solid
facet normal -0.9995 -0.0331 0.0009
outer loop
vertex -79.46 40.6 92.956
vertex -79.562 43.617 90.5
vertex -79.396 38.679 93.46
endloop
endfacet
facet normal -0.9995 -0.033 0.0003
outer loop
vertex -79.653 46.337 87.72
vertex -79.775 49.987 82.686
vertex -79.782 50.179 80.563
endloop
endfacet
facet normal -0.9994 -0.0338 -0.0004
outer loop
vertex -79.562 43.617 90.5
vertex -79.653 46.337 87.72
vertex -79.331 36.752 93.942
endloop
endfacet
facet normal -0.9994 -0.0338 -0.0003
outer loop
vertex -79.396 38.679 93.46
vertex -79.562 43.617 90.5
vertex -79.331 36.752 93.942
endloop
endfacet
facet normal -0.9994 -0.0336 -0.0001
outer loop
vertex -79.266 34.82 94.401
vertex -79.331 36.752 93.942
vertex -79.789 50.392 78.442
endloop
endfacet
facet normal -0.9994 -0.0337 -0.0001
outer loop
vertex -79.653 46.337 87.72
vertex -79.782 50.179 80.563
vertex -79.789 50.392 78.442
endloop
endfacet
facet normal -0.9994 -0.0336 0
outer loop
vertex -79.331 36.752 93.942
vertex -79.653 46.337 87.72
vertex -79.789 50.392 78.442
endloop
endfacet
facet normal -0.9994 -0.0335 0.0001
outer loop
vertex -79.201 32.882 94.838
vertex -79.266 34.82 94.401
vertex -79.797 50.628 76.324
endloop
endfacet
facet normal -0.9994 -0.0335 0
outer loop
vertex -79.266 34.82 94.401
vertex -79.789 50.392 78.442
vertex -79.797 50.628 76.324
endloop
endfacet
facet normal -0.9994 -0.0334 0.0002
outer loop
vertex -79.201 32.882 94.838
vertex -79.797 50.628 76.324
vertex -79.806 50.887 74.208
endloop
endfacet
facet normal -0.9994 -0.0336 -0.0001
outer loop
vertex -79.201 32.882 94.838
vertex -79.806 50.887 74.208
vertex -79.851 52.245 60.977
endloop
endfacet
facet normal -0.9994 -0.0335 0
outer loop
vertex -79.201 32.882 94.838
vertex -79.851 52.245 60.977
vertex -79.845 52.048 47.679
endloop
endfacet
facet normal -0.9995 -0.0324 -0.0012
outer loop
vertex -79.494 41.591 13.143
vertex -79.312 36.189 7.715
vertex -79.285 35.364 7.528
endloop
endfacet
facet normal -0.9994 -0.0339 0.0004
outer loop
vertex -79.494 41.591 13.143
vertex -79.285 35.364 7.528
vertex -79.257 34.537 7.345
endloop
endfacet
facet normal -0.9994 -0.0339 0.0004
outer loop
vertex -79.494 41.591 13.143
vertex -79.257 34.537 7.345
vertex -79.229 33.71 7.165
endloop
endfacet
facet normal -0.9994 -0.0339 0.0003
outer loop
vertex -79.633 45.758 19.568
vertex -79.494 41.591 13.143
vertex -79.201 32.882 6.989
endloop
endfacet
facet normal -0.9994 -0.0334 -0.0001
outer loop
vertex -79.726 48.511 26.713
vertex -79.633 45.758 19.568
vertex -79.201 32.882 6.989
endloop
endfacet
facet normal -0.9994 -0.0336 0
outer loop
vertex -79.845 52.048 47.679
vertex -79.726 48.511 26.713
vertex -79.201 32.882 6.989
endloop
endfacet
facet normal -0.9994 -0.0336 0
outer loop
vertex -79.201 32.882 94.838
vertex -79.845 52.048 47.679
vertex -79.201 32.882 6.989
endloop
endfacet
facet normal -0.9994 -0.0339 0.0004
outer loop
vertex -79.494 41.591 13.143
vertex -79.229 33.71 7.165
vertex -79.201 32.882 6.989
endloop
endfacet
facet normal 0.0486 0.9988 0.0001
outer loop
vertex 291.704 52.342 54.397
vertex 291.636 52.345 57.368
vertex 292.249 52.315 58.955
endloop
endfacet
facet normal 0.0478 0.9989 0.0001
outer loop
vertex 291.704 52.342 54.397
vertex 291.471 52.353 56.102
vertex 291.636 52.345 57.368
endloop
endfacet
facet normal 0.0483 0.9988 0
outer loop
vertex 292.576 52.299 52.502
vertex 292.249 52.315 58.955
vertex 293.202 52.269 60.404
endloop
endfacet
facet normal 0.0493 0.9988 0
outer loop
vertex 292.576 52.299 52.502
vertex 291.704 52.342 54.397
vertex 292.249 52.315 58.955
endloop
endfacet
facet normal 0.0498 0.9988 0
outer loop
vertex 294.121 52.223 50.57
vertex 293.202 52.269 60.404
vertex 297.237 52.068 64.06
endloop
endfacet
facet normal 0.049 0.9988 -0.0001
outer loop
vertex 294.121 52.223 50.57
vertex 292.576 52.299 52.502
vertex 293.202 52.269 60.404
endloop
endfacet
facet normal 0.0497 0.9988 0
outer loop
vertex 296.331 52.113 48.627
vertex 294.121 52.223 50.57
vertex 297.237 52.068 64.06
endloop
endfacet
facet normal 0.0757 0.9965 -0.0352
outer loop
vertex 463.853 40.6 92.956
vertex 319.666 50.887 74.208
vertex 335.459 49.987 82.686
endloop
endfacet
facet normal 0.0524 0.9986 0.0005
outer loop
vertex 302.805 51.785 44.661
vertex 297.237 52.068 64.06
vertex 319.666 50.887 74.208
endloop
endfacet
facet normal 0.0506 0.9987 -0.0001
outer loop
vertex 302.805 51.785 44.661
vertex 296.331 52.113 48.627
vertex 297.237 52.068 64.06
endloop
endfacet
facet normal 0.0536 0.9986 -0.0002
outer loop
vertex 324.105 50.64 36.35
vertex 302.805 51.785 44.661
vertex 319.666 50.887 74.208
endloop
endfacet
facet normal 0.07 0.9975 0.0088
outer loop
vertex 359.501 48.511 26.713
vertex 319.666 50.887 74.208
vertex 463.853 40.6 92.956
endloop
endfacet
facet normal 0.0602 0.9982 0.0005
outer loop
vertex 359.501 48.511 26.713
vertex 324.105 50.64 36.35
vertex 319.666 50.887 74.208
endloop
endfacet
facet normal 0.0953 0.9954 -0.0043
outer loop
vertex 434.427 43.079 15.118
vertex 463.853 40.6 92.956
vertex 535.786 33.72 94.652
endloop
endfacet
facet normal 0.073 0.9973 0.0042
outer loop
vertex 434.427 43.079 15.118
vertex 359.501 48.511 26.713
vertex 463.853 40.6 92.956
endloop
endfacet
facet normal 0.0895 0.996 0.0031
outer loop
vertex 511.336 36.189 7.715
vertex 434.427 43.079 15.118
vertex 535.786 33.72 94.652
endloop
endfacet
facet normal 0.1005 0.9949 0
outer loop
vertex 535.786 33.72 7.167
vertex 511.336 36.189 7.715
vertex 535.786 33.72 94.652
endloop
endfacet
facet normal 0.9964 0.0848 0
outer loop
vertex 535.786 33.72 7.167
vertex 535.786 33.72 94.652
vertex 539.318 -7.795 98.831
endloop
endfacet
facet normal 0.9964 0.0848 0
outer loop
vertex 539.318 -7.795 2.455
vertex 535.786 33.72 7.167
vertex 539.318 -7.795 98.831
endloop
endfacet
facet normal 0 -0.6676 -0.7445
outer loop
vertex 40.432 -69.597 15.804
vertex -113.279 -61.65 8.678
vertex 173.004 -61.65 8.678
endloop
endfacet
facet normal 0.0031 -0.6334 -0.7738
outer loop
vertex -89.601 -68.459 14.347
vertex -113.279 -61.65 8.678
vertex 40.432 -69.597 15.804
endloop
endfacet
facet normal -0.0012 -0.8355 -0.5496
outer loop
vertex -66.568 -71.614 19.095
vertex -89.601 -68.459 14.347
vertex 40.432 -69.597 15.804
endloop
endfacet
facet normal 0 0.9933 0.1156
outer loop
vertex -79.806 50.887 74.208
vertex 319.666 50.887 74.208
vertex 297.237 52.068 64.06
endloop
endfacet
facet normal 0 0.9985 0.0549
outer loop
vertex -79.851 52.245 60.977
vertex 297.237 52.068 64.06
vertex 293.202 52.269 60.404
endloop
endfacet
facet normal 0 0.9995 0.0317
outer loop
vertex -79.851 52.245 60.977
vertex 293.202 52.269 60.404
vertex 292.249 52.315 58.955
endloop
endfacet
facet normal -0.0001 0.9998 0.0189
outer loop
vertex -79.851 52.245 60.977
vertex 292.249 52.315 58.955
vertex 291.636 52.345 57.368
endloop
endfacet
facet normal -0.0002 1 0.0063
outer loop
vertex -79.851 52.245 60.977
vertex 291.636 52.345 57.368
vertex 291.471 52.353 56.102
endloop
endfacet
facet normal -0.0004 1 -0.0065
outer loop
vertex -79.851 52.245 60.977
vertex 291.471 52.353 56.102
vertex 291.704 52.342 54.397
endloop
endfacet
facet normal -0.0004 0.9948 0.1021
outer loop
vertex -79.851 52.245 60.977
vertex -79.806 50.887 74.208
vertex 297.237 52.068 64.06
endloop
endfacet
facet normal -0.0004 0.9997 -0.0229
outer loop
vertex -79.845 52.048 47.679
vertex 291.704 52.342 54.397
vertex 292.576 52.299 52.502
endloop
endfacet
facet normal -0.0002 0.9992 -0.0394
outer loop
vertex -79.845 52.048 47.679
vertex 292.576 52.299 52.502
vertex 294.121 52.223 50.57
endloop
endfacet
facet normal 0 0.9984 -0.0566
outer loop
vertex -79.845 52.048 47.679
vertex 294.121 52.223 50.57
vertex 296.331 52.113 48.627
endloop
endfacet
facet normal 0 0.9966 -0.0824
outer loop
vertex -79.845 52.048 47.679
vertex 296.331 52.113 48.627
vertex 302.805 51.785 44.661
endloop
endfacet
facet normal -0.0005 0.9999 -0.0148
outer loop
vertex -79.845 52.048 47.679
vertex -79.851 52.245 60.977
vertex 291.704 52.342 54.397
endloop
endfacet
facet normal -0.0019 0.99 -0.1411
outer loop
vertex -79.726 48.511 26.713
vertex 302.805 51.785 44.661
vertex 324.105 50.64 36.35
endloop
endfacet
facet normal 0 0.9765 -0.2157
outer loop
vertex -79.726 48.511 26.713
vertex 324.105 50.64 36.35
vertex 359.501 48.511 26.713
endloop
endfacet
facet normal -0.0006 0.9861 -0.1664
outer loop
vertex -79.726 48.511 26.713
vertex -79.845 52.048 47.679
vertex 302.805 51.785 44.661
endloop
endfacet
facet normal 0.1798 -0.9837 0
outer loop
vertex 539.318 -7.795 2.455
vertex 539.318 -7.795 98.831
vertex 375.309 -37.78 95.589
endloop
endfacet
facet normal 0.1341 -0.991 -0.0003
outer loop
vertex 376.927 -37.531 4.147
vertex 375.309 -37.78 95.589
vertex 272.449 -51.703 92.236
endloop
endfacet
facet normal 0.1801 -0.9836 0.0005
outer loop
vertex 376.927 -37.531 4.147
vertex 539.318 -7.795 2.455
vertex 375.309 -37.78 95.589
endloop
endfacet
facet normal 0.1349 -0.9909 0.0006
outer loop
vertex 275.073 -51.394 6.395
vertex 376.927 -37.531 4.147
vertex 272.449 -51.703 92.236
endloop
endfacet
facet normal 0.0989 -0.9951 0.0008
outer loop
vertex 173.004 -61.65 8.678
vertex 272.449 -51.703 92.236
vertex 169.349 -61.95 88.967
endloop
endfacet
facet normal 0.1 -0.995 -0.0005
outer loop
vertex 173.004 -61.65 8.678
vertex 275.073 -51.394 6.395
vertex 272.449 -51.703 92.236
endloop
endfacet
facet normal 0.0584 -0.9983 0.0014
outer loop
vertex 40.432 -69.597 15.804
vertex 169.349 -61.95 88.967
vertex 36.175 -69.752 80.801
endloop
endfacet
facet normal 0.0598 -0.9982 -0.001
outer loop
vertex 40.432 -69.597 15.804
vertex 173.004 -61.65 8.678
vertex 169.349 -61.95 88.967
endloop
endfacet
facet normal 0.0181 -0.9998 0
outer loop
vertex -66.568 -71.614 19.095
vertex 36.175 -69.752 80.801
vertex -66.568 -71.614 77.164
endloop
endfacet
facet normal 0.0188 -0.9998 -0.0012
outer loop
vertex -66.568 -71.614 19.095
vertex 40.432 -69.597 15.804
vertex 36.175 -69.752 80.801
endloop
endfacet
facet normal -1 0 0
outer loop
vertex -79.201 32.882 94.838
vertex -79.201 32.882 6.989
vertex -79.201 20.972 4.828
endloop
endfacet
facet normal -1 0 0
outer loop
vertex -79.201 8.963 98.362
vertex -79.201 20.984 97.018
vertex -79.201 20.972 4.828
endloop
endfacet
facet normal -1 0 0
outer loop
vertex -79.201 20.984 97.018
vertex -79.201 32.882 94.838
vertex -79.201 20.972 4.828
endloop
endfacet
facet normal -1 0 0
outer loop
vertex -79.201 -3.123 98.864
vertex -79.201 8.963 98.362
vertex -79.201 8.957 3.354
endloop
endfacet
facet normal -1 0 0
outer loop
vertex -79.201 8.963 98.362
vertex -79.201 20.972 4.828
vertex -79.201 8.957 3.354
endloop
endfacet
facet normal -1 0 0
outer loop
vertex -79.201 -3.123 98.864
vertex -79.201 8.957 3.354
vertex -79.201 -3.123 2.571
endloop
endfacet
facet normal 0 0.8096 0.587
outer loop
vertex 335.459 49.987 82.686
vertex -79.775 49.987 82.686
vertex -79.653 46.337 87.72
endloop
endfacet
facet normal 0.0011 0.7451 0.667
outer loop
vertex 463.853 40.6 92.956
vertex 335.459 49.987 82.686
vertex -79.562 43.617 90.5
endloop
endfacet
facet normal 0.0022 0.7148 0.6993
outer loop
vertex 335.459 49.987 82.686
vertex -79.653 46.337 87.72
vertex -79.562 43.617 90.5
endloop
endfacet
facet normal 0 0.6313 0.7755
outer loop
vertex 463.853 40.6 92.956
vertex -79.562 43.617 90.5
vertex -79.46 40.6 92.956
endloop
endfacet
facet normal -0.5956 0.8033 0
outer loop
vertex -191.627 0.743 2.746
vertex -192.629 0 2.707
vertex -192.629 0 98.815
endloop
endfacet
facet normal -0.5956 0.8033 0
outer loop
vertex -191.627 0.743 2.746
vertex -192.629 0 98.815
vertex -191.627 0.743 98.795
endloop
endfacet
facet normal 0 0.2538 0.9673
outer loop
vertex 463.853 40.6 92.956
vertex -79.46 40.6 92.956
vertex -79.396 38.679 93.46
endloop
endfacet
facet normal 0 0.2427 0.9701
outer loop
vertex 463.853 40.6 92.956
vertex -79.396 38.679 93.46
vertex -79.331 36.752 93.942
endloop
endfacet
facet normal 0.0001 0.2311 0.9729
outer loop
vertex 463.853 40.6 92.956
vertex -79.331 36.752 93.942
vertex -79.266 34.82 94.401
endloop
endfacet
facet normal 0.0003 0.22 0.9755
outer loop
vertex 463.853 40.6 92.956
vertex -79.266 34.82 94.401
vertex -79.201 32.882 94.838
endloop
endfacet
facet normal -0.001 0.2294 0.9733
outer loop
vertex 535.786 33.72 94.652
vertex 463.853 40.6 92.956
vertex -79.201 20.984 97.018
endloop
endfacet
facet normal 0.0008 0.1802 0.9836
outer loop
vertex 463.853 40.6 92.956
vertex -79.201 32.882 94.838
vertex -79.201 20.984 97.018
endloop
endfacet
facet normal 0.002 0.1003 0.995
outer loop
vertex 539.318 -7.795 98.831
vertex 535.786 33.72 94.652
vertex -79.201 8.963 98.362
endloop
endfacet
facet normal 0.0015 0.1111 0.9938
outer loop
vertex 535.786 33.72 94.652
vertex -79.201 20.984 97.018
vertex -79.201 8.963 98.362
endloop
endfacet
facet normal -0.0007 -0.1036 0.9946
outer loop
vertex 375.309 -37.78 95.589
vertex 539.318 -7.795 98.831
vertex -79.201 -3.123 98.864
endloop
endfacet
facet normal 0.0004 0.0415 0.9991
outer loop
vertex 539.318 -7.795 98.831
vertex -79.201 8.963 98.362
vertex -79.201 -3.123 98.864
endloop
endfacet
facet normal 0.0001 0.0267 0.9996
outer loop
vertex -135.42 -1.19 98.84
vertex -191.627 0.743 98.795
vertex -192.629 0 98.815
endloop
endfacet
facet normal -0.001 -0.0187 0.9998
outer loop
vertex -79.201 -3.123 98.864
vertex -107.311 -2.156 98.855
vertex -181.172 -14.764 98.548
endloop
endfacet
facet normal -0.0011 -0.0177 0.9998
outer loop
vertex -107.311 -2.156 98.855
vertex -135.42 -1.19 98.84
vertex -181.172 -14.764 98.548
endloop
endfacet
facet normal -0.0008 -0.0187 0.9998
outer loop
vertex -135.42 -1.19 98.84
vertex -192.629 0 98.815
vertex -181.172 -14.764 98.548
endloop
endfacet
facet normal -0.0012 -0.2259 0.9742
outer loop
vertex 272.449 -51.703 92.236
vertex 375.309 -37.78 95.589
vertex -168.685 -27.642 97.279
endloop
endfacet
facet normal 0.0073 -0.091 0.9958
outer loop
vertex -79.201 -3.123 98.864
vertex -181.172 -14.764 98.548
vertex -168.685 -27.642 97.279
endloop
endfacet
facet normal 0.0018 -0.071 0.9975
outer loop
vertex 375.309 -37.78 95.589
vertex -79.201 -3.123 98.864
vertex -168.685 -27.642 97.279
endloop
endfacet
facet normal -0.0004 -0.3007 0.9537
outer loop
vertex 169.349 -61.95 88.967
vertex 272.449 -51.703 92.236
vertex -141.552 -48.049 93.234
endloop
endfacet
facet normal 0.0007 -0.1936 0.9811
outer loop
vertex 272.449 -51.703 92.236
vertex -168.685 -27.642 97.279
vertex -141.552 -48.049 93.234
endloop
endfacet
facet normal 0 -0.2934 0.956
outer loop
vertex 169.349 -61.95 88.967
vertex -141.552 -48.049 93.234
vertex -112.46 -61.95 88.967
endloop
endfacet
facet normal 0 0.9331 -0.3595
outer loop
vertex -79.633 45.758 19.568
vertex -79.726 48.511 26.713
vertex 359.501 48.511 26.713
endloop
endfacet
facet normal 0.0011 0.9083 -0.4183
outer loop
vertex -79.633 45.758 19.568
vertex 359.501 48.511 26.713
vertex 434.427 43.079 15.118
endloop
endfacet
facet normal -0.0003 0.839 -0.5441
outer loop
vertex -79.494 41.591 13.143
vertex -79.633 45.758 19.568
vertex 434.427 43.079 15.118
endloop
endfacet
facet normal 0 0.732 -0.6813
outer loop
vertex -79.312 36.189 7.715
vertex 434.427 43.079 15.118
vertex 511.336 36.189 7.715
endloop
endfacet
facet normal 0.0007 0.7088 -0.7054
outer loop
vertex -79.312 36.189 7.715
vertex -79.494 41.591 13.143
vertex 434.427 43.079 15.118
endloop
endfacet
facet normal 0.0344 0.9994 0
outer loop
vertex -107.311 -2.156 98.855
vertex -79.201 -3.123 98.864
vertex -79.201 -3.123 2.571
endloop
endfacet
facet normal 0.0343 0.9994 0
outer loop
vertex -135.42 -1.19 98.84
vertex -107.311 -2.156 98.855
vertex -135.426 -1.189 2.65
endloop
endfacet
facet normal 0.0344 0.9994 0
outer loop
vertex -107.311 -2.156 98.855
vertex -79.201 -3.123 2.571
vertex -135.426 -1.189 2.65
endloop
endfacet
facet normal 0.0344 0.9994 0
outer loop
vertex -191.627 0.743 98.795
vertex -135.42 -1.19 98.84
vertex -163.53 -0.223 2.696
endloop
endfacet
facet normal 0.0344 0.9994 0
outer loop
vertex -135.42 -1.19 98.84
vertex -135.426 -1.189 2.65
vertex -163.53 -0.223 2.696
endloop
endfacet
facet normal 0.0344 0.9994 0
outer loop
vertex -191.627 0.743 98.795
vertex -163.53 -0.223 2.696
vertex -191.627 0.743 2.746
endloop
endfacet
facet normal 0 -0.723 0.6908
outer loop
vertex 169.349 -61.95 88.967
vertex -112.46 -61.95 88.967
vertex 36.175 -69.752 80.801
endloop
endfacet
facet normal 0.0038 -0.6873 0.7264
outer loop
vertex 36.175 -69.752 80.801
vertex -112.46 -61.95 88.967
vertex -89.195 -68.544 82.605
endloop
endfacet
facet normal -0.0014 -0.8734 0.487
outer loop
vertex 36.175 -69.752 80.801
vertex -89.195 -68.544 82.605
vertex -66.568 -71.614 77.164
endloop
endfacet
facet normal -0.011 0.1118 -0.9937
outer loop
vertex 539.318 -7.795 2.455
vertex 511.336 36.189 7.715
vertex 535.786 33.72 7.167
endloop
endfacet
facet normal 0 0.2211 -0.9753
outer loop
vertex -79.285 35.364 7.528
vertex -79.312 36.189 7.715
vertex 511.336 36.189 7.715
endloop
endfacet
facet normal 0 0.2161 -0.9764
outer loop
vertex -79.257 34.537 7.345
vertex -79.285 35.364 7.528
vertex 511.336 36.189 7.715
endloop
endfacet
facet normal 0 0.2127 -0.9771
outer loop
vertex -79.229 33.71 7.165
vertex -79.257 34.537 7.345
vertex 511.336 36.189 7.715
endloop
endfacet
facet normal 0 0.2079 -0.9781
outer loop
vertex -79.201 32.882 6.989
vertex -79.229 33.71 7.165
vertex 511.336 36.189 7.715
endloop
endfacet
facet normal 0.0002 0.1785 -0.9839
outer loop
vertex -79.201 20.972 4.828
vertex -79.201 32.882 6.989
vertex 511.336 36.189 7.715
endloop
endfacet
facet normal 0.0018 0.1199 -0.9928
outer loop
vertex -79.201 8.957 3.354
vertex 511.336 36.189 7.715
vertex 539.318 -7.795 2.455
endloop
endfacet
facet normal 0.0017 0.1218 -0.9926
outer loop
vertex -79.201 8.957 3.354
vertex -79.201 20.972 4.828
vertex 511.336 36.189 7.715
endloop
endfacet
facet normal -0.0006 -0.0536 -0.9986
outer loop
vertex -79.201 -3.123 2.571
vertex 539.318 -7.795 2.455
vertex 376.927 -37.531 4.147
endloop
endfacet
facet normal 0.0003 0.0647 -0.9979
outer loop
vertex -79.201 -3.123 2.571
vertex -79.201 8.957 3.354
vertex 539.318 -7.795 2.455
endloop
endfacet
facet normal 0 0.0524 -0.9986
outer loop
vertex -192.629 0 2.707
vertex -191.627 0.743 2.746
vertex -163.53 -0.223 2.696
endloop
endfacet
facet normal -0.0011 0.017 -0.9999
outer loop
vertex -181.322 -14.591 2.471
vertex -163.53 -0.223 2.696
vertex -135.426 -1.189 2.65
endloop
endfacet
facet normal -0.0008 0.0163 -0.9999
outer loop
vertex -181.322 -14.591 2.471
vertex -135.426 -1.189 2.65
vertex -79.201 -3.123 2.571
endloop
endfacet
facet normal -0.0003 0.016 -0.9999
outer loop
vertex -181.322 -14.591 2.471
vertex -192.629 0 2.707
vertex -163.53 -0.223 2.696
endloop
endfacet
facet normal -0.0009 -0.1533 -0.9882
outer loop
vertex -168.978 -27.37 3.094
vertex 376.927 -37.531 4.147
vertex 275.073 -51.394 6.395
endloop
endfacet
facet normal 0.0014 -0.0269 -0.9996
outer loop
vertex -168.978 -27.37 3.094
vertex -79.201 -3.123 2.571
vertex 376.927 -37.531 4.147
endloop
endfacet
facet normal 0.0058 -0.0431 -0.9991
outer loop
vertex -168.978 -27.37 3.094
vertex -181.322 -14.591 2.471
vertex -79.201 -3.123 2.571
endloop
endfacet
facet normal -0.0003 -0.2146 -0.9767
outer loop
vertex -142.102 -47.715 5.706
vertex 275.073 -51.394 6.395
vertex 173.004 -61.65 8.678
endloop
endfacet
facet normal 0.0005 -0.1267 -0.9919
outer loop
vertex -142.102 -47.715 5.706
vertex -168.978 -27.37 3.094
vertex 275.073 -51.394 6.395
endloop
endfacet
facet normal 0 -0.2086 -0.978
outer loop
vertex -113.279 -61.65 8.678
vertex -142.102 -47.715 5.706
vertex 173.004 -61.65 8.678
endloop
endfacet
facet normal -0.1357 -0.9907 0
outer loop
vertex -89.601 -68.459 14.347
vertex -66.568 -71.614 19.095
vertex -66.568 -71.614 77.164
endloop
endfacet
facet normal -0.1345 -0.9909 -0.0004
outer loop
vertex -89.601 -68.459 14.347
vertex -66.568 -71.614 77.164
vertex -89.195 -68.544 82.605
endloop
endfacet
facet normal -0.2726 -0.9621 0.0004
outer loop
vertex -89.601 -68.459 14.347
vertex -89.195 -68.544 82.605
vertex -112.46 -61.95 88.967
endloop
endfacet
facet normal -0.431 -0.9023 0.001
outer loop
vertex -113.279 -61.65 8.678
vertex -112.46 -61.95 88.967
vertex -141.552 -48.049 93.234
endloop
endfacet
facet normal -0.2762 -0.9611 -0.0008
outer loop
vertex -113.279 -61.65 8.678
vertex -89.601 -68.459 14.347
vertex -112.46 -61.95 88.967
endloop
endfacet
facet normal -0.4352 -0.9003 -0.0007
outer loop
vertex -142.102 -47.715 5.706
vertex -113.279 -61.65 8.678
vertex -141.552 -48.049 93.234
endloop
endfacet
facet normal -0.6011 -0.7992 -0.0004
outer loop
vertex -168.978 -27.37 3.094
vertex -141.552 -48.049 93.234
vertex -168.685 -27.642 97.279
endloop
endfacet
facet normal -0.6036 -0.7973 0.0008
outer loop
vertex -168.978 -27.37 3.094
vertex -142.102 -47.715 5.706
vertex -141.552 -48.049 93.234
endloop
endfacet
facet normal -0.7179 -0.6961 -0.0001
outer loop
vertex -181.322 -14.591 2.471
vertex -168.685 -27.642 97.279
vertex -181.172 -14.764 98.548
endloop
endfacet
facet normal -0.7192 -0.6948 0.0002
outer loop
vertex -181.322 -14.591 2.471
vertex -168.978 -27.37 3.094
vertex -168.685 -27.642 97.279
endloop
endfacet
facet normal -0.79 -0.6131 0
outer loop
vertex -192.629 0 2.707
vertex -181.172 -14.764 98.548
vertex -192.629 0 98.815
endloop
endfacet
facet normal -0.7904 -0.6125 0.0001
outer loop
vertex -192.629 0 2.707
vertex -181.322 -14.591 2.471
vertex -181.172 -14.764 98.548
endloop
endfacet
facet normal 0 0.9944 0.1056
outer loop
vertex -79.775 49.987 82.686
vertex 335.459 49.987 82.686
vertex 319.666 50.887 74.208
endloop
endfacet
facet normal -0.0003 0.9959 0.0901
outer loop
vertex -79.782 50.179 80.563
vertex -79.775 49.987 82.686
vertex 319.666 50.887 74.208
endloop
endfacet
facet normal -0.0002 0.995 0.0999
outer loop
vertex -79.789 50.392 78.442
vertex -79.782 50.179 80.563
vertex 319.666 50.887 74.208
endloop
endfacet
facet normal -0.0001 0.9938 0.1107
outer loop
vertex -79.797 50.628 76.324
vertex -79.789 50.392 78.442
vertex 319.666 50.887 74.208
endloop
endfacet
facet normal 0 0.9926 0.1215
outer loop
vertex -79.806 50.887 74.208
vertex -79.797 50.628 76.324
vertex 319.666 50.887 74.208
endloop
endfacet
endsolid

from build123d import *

# Parameters (mm, degrees)
BOSS_EXTRUDE1_DEPTH     = 100
CUT_EXTRUDE3_DEPTH      = 554.165701555
CUT_EXTRUDE3_DEPTH_BACK = 554.165701555
CUT_EXTRUDE5_DEPTH      = 553.962044682
CUT_EXTRUDE5_DEPTH_BACK = 553.962044682
CUT_EXTRUDE7_DEPTH      = 553.962044682
CUT_EXTRUDE7_DEPTH_BACK = 553.962044682


with BuildPart() as part:
    # Sketch1 → Boss-Extrude1 (new body)
    with BuildSketch(Plane.XY):
        with BuildLine():
            ThreePointArc((-192.629438793, 0), (-136.135725272, 33.719619965), (-73.991525193, 55.321722514))
            ThreePointArc((-73.991525193, 55.321722514), (231.264395529, 54.89097703), (535.785554592, 33.719619965))
            ThreePointArc((535.785554592, 33.719619965), (536.798211586, 12.89819156), (539.317827414, -7.795017256))
            ThreePointArc((539.317827414, -7.795017256), (238.042039648, -55.533392614), (-66.568309368, -71.614065728))
            ThreePointArc((-66.568309368, -71.614065728), (-137.800866021, -50.244872094), (-192.629438793, 0))
        make_face()
    extrude(amount=BOSS_EXTRUDE1_DEPTH)

    # Sketch2 → Cut-Extrude3 (cut, two sides: drawn at the far end of the back side and taken through both)
    with BuildSketch(Plane(origin=(0, 0, 0), x_dir=(0, 0, -1), z_dir=(1, 0, 0)).offset(-CUT_EXTRUDE3_DEPTH_BACK)):
        with BuildLine():
            ThreePointArc((-65.447202994, 54.830423707), (-80.892507985, 50.983746932), (-92.956496986, 40.600368972))
            ThreePointArc((-92.956496986, 40.600368972), (-98.736407831, -10.977338679), (-88.967303886, -61.950193259))
            ThreePointArc((-88.967303886, -61.950193259), (-83.10915251, -68.165990231), (-75.589128758, -72.216090516))
            ThreePointArc((-75.589128758, -72.216090516), (-123.822815089, -94.064788666), (-173.378544397, -75.407784602))
            ThreePointArc((-173.378544397, -75.407784602), (-163.802190068, -4.583325871), (-135.262897635, 60.940099743))
            ThreePointArc((-135.262897635, 60.940099743), (-100.366866686, 80.430667917), (-61.326949176, 89.003885783))
            ThreePointArc((-61.326949176, 89.003885783), (-63.560434952, 71.938056418), (-65.447202994, 54.830423707))
        make_face()
    extrude(amount=CUT_EXTRUDE3_DEPTH + CUT_EXTRUDE3_DEPTH_BACK, mode=Mode.SUBTRACT)

    # Sketch3 → Cut-Extrude5 (cut, two sides: drawn at the far end of the back side and taken through both)
    with BuildSketch(Plane(origin=(0, 0, 0), x_dir=(0, 0, -1), z_dir=(1, 0, 0)).offset(-CUT_EXTRUDE5_DEPTH_BACK)):
        with BuildLine():
            ThreePointArc((-74.208303325, 50.886642831), (-50.335012976, 52.211638999), (-26.713093985, 48.511024166))
            ThreePointArc((-26.713093985, 48.511024166), (-16.247111553, 43.841102683), (-7.714956491, 36.189482926))
            ThreePointArc((-7.714956491, 36.189482926), (-2.445034952, -12.786836037), (-8.678058045, -61.649923489))
            ThreePointArc((-8.678058045, -61.649923489), (-17.453523943, -70.69509128), (-29.511303704, -74.360307413))
            ThreePointArc((-29.511303704, -74.360307413), (33.955140221, -79.826327987), (85.286434054, -42.104117568))
            ThreePointArc((85.286434054, -42.104117568), (41.180066923, 16.064388488), (12.319514625, 83.116720583))
            ThreePointArc((12.319514625, 83.116720583), (-170.558095104, 441.821406771), (-74.208303325, 50.886642831))
        make_face()
    extrude(amount=CUT_EXTRUDE5_DEPTH + CUT_EXTRUDE5_DEPTH_BACK, mode=Mode.SUBTRACT)

    # Sketch4 → Cut-Extrude7 (cut, two sides: drawn at the far end of the back side and taken through both)
    with BuildSketch(Plane.XY.offset(-CUT_EXTRUDE7_DEPTH_BACK)):
        Polygon((-79.201401397, 32.882000093), (-79.201401397, -3.122719846), (-222.768125928, 1.814195624), (-233.222282556, 17.110218535), (-80.529357675, 72.456896947), align=None)
    extrude(amount=CUT_EXTRUDE7_DEPTH + CUT_EXTRUDE7_DEPTH_BACK, mode=Mode.SUBTRACT)


solid = part.part
